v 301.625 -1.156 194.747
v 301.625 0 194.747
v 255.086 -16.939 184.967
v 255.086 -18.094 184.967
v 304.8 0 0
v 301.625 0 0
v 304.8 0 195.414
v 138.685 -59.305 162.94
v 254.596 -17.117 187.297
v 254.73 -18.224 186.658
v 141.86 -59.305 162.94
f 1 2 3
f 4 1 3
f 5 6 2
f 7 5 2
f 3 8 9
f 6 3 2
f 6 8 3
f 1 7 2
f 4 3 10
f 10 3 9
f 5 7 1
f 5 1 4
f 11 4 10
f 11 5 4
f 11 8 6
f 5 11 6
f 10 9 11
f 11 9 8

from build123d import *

# Parameters (mm, degrees)
BOSS_EXTRUDE1_DEPTH     = 304.8
CUT_EXTRUDE1_DEPTH      = 198.18
CUT_EXTRUDE1_DEPTH_BACK = 1
CUT_EXTRUDE2_DEPTH      = 60.305329017


with BuildPart() as part:
    # Sketch1 → Boss-Extrude1 (new body)
    with BuildSketch(Plane(origin=(0, 0, 0), x_dir=(0, 0, -1), z_dir=(1, 0, 0))):
        Polygon((0, 0), (-197.18, 0), (-162.940052328, -59.305329017), align=None)
    extrude(amount=BOSS_EXTRUDE1_DEPTH)

    # Sketch2 → Cut-Extrude1 (cut, two sides)
    with BuildSketch(Plane.XY) as cut_extrude1_sk:
        Polygon((138.684947672, -59.305329017), (301.625, 0), (0, 0), (0, -59.305329017), align=None)
        Polygon((304.8, 0), (141.859947672, -59.305329017), (304.8, -59.305329017), align=None)
    extrude(amount=CUT_EXTRUDE1_DEPTH, mode=Mode.SUBTRACT)
    extrude(cut_extrude1_sk.sketch, amount=-CUT_EXTRUDE1_DEPTH_BACK, mode=Mode.SUBTRACT)

    # Sketch3 → Cut-Extrude2 (cut, through all)
    with BuildSketch(Plane(origin=(0, 0, 0), x_dir=(1, 0, 0), z_dir=(0, 1, 0))):
        Polygon((254.596089188, -187.297424032), (301.625, -197.18), (301.625, -194.746742189), (255.085785802, -184.967070242), align=None)
        Polygon((301.625, -194.746742189), (301.625, -197.18), (304.8, -197.18), (304.8, -195.413931332), align=None)
    extrude(amount=-CUT_EXTRUDE2_DEPTH, mode=Mode.SUBTRACT)


solid = part.part
